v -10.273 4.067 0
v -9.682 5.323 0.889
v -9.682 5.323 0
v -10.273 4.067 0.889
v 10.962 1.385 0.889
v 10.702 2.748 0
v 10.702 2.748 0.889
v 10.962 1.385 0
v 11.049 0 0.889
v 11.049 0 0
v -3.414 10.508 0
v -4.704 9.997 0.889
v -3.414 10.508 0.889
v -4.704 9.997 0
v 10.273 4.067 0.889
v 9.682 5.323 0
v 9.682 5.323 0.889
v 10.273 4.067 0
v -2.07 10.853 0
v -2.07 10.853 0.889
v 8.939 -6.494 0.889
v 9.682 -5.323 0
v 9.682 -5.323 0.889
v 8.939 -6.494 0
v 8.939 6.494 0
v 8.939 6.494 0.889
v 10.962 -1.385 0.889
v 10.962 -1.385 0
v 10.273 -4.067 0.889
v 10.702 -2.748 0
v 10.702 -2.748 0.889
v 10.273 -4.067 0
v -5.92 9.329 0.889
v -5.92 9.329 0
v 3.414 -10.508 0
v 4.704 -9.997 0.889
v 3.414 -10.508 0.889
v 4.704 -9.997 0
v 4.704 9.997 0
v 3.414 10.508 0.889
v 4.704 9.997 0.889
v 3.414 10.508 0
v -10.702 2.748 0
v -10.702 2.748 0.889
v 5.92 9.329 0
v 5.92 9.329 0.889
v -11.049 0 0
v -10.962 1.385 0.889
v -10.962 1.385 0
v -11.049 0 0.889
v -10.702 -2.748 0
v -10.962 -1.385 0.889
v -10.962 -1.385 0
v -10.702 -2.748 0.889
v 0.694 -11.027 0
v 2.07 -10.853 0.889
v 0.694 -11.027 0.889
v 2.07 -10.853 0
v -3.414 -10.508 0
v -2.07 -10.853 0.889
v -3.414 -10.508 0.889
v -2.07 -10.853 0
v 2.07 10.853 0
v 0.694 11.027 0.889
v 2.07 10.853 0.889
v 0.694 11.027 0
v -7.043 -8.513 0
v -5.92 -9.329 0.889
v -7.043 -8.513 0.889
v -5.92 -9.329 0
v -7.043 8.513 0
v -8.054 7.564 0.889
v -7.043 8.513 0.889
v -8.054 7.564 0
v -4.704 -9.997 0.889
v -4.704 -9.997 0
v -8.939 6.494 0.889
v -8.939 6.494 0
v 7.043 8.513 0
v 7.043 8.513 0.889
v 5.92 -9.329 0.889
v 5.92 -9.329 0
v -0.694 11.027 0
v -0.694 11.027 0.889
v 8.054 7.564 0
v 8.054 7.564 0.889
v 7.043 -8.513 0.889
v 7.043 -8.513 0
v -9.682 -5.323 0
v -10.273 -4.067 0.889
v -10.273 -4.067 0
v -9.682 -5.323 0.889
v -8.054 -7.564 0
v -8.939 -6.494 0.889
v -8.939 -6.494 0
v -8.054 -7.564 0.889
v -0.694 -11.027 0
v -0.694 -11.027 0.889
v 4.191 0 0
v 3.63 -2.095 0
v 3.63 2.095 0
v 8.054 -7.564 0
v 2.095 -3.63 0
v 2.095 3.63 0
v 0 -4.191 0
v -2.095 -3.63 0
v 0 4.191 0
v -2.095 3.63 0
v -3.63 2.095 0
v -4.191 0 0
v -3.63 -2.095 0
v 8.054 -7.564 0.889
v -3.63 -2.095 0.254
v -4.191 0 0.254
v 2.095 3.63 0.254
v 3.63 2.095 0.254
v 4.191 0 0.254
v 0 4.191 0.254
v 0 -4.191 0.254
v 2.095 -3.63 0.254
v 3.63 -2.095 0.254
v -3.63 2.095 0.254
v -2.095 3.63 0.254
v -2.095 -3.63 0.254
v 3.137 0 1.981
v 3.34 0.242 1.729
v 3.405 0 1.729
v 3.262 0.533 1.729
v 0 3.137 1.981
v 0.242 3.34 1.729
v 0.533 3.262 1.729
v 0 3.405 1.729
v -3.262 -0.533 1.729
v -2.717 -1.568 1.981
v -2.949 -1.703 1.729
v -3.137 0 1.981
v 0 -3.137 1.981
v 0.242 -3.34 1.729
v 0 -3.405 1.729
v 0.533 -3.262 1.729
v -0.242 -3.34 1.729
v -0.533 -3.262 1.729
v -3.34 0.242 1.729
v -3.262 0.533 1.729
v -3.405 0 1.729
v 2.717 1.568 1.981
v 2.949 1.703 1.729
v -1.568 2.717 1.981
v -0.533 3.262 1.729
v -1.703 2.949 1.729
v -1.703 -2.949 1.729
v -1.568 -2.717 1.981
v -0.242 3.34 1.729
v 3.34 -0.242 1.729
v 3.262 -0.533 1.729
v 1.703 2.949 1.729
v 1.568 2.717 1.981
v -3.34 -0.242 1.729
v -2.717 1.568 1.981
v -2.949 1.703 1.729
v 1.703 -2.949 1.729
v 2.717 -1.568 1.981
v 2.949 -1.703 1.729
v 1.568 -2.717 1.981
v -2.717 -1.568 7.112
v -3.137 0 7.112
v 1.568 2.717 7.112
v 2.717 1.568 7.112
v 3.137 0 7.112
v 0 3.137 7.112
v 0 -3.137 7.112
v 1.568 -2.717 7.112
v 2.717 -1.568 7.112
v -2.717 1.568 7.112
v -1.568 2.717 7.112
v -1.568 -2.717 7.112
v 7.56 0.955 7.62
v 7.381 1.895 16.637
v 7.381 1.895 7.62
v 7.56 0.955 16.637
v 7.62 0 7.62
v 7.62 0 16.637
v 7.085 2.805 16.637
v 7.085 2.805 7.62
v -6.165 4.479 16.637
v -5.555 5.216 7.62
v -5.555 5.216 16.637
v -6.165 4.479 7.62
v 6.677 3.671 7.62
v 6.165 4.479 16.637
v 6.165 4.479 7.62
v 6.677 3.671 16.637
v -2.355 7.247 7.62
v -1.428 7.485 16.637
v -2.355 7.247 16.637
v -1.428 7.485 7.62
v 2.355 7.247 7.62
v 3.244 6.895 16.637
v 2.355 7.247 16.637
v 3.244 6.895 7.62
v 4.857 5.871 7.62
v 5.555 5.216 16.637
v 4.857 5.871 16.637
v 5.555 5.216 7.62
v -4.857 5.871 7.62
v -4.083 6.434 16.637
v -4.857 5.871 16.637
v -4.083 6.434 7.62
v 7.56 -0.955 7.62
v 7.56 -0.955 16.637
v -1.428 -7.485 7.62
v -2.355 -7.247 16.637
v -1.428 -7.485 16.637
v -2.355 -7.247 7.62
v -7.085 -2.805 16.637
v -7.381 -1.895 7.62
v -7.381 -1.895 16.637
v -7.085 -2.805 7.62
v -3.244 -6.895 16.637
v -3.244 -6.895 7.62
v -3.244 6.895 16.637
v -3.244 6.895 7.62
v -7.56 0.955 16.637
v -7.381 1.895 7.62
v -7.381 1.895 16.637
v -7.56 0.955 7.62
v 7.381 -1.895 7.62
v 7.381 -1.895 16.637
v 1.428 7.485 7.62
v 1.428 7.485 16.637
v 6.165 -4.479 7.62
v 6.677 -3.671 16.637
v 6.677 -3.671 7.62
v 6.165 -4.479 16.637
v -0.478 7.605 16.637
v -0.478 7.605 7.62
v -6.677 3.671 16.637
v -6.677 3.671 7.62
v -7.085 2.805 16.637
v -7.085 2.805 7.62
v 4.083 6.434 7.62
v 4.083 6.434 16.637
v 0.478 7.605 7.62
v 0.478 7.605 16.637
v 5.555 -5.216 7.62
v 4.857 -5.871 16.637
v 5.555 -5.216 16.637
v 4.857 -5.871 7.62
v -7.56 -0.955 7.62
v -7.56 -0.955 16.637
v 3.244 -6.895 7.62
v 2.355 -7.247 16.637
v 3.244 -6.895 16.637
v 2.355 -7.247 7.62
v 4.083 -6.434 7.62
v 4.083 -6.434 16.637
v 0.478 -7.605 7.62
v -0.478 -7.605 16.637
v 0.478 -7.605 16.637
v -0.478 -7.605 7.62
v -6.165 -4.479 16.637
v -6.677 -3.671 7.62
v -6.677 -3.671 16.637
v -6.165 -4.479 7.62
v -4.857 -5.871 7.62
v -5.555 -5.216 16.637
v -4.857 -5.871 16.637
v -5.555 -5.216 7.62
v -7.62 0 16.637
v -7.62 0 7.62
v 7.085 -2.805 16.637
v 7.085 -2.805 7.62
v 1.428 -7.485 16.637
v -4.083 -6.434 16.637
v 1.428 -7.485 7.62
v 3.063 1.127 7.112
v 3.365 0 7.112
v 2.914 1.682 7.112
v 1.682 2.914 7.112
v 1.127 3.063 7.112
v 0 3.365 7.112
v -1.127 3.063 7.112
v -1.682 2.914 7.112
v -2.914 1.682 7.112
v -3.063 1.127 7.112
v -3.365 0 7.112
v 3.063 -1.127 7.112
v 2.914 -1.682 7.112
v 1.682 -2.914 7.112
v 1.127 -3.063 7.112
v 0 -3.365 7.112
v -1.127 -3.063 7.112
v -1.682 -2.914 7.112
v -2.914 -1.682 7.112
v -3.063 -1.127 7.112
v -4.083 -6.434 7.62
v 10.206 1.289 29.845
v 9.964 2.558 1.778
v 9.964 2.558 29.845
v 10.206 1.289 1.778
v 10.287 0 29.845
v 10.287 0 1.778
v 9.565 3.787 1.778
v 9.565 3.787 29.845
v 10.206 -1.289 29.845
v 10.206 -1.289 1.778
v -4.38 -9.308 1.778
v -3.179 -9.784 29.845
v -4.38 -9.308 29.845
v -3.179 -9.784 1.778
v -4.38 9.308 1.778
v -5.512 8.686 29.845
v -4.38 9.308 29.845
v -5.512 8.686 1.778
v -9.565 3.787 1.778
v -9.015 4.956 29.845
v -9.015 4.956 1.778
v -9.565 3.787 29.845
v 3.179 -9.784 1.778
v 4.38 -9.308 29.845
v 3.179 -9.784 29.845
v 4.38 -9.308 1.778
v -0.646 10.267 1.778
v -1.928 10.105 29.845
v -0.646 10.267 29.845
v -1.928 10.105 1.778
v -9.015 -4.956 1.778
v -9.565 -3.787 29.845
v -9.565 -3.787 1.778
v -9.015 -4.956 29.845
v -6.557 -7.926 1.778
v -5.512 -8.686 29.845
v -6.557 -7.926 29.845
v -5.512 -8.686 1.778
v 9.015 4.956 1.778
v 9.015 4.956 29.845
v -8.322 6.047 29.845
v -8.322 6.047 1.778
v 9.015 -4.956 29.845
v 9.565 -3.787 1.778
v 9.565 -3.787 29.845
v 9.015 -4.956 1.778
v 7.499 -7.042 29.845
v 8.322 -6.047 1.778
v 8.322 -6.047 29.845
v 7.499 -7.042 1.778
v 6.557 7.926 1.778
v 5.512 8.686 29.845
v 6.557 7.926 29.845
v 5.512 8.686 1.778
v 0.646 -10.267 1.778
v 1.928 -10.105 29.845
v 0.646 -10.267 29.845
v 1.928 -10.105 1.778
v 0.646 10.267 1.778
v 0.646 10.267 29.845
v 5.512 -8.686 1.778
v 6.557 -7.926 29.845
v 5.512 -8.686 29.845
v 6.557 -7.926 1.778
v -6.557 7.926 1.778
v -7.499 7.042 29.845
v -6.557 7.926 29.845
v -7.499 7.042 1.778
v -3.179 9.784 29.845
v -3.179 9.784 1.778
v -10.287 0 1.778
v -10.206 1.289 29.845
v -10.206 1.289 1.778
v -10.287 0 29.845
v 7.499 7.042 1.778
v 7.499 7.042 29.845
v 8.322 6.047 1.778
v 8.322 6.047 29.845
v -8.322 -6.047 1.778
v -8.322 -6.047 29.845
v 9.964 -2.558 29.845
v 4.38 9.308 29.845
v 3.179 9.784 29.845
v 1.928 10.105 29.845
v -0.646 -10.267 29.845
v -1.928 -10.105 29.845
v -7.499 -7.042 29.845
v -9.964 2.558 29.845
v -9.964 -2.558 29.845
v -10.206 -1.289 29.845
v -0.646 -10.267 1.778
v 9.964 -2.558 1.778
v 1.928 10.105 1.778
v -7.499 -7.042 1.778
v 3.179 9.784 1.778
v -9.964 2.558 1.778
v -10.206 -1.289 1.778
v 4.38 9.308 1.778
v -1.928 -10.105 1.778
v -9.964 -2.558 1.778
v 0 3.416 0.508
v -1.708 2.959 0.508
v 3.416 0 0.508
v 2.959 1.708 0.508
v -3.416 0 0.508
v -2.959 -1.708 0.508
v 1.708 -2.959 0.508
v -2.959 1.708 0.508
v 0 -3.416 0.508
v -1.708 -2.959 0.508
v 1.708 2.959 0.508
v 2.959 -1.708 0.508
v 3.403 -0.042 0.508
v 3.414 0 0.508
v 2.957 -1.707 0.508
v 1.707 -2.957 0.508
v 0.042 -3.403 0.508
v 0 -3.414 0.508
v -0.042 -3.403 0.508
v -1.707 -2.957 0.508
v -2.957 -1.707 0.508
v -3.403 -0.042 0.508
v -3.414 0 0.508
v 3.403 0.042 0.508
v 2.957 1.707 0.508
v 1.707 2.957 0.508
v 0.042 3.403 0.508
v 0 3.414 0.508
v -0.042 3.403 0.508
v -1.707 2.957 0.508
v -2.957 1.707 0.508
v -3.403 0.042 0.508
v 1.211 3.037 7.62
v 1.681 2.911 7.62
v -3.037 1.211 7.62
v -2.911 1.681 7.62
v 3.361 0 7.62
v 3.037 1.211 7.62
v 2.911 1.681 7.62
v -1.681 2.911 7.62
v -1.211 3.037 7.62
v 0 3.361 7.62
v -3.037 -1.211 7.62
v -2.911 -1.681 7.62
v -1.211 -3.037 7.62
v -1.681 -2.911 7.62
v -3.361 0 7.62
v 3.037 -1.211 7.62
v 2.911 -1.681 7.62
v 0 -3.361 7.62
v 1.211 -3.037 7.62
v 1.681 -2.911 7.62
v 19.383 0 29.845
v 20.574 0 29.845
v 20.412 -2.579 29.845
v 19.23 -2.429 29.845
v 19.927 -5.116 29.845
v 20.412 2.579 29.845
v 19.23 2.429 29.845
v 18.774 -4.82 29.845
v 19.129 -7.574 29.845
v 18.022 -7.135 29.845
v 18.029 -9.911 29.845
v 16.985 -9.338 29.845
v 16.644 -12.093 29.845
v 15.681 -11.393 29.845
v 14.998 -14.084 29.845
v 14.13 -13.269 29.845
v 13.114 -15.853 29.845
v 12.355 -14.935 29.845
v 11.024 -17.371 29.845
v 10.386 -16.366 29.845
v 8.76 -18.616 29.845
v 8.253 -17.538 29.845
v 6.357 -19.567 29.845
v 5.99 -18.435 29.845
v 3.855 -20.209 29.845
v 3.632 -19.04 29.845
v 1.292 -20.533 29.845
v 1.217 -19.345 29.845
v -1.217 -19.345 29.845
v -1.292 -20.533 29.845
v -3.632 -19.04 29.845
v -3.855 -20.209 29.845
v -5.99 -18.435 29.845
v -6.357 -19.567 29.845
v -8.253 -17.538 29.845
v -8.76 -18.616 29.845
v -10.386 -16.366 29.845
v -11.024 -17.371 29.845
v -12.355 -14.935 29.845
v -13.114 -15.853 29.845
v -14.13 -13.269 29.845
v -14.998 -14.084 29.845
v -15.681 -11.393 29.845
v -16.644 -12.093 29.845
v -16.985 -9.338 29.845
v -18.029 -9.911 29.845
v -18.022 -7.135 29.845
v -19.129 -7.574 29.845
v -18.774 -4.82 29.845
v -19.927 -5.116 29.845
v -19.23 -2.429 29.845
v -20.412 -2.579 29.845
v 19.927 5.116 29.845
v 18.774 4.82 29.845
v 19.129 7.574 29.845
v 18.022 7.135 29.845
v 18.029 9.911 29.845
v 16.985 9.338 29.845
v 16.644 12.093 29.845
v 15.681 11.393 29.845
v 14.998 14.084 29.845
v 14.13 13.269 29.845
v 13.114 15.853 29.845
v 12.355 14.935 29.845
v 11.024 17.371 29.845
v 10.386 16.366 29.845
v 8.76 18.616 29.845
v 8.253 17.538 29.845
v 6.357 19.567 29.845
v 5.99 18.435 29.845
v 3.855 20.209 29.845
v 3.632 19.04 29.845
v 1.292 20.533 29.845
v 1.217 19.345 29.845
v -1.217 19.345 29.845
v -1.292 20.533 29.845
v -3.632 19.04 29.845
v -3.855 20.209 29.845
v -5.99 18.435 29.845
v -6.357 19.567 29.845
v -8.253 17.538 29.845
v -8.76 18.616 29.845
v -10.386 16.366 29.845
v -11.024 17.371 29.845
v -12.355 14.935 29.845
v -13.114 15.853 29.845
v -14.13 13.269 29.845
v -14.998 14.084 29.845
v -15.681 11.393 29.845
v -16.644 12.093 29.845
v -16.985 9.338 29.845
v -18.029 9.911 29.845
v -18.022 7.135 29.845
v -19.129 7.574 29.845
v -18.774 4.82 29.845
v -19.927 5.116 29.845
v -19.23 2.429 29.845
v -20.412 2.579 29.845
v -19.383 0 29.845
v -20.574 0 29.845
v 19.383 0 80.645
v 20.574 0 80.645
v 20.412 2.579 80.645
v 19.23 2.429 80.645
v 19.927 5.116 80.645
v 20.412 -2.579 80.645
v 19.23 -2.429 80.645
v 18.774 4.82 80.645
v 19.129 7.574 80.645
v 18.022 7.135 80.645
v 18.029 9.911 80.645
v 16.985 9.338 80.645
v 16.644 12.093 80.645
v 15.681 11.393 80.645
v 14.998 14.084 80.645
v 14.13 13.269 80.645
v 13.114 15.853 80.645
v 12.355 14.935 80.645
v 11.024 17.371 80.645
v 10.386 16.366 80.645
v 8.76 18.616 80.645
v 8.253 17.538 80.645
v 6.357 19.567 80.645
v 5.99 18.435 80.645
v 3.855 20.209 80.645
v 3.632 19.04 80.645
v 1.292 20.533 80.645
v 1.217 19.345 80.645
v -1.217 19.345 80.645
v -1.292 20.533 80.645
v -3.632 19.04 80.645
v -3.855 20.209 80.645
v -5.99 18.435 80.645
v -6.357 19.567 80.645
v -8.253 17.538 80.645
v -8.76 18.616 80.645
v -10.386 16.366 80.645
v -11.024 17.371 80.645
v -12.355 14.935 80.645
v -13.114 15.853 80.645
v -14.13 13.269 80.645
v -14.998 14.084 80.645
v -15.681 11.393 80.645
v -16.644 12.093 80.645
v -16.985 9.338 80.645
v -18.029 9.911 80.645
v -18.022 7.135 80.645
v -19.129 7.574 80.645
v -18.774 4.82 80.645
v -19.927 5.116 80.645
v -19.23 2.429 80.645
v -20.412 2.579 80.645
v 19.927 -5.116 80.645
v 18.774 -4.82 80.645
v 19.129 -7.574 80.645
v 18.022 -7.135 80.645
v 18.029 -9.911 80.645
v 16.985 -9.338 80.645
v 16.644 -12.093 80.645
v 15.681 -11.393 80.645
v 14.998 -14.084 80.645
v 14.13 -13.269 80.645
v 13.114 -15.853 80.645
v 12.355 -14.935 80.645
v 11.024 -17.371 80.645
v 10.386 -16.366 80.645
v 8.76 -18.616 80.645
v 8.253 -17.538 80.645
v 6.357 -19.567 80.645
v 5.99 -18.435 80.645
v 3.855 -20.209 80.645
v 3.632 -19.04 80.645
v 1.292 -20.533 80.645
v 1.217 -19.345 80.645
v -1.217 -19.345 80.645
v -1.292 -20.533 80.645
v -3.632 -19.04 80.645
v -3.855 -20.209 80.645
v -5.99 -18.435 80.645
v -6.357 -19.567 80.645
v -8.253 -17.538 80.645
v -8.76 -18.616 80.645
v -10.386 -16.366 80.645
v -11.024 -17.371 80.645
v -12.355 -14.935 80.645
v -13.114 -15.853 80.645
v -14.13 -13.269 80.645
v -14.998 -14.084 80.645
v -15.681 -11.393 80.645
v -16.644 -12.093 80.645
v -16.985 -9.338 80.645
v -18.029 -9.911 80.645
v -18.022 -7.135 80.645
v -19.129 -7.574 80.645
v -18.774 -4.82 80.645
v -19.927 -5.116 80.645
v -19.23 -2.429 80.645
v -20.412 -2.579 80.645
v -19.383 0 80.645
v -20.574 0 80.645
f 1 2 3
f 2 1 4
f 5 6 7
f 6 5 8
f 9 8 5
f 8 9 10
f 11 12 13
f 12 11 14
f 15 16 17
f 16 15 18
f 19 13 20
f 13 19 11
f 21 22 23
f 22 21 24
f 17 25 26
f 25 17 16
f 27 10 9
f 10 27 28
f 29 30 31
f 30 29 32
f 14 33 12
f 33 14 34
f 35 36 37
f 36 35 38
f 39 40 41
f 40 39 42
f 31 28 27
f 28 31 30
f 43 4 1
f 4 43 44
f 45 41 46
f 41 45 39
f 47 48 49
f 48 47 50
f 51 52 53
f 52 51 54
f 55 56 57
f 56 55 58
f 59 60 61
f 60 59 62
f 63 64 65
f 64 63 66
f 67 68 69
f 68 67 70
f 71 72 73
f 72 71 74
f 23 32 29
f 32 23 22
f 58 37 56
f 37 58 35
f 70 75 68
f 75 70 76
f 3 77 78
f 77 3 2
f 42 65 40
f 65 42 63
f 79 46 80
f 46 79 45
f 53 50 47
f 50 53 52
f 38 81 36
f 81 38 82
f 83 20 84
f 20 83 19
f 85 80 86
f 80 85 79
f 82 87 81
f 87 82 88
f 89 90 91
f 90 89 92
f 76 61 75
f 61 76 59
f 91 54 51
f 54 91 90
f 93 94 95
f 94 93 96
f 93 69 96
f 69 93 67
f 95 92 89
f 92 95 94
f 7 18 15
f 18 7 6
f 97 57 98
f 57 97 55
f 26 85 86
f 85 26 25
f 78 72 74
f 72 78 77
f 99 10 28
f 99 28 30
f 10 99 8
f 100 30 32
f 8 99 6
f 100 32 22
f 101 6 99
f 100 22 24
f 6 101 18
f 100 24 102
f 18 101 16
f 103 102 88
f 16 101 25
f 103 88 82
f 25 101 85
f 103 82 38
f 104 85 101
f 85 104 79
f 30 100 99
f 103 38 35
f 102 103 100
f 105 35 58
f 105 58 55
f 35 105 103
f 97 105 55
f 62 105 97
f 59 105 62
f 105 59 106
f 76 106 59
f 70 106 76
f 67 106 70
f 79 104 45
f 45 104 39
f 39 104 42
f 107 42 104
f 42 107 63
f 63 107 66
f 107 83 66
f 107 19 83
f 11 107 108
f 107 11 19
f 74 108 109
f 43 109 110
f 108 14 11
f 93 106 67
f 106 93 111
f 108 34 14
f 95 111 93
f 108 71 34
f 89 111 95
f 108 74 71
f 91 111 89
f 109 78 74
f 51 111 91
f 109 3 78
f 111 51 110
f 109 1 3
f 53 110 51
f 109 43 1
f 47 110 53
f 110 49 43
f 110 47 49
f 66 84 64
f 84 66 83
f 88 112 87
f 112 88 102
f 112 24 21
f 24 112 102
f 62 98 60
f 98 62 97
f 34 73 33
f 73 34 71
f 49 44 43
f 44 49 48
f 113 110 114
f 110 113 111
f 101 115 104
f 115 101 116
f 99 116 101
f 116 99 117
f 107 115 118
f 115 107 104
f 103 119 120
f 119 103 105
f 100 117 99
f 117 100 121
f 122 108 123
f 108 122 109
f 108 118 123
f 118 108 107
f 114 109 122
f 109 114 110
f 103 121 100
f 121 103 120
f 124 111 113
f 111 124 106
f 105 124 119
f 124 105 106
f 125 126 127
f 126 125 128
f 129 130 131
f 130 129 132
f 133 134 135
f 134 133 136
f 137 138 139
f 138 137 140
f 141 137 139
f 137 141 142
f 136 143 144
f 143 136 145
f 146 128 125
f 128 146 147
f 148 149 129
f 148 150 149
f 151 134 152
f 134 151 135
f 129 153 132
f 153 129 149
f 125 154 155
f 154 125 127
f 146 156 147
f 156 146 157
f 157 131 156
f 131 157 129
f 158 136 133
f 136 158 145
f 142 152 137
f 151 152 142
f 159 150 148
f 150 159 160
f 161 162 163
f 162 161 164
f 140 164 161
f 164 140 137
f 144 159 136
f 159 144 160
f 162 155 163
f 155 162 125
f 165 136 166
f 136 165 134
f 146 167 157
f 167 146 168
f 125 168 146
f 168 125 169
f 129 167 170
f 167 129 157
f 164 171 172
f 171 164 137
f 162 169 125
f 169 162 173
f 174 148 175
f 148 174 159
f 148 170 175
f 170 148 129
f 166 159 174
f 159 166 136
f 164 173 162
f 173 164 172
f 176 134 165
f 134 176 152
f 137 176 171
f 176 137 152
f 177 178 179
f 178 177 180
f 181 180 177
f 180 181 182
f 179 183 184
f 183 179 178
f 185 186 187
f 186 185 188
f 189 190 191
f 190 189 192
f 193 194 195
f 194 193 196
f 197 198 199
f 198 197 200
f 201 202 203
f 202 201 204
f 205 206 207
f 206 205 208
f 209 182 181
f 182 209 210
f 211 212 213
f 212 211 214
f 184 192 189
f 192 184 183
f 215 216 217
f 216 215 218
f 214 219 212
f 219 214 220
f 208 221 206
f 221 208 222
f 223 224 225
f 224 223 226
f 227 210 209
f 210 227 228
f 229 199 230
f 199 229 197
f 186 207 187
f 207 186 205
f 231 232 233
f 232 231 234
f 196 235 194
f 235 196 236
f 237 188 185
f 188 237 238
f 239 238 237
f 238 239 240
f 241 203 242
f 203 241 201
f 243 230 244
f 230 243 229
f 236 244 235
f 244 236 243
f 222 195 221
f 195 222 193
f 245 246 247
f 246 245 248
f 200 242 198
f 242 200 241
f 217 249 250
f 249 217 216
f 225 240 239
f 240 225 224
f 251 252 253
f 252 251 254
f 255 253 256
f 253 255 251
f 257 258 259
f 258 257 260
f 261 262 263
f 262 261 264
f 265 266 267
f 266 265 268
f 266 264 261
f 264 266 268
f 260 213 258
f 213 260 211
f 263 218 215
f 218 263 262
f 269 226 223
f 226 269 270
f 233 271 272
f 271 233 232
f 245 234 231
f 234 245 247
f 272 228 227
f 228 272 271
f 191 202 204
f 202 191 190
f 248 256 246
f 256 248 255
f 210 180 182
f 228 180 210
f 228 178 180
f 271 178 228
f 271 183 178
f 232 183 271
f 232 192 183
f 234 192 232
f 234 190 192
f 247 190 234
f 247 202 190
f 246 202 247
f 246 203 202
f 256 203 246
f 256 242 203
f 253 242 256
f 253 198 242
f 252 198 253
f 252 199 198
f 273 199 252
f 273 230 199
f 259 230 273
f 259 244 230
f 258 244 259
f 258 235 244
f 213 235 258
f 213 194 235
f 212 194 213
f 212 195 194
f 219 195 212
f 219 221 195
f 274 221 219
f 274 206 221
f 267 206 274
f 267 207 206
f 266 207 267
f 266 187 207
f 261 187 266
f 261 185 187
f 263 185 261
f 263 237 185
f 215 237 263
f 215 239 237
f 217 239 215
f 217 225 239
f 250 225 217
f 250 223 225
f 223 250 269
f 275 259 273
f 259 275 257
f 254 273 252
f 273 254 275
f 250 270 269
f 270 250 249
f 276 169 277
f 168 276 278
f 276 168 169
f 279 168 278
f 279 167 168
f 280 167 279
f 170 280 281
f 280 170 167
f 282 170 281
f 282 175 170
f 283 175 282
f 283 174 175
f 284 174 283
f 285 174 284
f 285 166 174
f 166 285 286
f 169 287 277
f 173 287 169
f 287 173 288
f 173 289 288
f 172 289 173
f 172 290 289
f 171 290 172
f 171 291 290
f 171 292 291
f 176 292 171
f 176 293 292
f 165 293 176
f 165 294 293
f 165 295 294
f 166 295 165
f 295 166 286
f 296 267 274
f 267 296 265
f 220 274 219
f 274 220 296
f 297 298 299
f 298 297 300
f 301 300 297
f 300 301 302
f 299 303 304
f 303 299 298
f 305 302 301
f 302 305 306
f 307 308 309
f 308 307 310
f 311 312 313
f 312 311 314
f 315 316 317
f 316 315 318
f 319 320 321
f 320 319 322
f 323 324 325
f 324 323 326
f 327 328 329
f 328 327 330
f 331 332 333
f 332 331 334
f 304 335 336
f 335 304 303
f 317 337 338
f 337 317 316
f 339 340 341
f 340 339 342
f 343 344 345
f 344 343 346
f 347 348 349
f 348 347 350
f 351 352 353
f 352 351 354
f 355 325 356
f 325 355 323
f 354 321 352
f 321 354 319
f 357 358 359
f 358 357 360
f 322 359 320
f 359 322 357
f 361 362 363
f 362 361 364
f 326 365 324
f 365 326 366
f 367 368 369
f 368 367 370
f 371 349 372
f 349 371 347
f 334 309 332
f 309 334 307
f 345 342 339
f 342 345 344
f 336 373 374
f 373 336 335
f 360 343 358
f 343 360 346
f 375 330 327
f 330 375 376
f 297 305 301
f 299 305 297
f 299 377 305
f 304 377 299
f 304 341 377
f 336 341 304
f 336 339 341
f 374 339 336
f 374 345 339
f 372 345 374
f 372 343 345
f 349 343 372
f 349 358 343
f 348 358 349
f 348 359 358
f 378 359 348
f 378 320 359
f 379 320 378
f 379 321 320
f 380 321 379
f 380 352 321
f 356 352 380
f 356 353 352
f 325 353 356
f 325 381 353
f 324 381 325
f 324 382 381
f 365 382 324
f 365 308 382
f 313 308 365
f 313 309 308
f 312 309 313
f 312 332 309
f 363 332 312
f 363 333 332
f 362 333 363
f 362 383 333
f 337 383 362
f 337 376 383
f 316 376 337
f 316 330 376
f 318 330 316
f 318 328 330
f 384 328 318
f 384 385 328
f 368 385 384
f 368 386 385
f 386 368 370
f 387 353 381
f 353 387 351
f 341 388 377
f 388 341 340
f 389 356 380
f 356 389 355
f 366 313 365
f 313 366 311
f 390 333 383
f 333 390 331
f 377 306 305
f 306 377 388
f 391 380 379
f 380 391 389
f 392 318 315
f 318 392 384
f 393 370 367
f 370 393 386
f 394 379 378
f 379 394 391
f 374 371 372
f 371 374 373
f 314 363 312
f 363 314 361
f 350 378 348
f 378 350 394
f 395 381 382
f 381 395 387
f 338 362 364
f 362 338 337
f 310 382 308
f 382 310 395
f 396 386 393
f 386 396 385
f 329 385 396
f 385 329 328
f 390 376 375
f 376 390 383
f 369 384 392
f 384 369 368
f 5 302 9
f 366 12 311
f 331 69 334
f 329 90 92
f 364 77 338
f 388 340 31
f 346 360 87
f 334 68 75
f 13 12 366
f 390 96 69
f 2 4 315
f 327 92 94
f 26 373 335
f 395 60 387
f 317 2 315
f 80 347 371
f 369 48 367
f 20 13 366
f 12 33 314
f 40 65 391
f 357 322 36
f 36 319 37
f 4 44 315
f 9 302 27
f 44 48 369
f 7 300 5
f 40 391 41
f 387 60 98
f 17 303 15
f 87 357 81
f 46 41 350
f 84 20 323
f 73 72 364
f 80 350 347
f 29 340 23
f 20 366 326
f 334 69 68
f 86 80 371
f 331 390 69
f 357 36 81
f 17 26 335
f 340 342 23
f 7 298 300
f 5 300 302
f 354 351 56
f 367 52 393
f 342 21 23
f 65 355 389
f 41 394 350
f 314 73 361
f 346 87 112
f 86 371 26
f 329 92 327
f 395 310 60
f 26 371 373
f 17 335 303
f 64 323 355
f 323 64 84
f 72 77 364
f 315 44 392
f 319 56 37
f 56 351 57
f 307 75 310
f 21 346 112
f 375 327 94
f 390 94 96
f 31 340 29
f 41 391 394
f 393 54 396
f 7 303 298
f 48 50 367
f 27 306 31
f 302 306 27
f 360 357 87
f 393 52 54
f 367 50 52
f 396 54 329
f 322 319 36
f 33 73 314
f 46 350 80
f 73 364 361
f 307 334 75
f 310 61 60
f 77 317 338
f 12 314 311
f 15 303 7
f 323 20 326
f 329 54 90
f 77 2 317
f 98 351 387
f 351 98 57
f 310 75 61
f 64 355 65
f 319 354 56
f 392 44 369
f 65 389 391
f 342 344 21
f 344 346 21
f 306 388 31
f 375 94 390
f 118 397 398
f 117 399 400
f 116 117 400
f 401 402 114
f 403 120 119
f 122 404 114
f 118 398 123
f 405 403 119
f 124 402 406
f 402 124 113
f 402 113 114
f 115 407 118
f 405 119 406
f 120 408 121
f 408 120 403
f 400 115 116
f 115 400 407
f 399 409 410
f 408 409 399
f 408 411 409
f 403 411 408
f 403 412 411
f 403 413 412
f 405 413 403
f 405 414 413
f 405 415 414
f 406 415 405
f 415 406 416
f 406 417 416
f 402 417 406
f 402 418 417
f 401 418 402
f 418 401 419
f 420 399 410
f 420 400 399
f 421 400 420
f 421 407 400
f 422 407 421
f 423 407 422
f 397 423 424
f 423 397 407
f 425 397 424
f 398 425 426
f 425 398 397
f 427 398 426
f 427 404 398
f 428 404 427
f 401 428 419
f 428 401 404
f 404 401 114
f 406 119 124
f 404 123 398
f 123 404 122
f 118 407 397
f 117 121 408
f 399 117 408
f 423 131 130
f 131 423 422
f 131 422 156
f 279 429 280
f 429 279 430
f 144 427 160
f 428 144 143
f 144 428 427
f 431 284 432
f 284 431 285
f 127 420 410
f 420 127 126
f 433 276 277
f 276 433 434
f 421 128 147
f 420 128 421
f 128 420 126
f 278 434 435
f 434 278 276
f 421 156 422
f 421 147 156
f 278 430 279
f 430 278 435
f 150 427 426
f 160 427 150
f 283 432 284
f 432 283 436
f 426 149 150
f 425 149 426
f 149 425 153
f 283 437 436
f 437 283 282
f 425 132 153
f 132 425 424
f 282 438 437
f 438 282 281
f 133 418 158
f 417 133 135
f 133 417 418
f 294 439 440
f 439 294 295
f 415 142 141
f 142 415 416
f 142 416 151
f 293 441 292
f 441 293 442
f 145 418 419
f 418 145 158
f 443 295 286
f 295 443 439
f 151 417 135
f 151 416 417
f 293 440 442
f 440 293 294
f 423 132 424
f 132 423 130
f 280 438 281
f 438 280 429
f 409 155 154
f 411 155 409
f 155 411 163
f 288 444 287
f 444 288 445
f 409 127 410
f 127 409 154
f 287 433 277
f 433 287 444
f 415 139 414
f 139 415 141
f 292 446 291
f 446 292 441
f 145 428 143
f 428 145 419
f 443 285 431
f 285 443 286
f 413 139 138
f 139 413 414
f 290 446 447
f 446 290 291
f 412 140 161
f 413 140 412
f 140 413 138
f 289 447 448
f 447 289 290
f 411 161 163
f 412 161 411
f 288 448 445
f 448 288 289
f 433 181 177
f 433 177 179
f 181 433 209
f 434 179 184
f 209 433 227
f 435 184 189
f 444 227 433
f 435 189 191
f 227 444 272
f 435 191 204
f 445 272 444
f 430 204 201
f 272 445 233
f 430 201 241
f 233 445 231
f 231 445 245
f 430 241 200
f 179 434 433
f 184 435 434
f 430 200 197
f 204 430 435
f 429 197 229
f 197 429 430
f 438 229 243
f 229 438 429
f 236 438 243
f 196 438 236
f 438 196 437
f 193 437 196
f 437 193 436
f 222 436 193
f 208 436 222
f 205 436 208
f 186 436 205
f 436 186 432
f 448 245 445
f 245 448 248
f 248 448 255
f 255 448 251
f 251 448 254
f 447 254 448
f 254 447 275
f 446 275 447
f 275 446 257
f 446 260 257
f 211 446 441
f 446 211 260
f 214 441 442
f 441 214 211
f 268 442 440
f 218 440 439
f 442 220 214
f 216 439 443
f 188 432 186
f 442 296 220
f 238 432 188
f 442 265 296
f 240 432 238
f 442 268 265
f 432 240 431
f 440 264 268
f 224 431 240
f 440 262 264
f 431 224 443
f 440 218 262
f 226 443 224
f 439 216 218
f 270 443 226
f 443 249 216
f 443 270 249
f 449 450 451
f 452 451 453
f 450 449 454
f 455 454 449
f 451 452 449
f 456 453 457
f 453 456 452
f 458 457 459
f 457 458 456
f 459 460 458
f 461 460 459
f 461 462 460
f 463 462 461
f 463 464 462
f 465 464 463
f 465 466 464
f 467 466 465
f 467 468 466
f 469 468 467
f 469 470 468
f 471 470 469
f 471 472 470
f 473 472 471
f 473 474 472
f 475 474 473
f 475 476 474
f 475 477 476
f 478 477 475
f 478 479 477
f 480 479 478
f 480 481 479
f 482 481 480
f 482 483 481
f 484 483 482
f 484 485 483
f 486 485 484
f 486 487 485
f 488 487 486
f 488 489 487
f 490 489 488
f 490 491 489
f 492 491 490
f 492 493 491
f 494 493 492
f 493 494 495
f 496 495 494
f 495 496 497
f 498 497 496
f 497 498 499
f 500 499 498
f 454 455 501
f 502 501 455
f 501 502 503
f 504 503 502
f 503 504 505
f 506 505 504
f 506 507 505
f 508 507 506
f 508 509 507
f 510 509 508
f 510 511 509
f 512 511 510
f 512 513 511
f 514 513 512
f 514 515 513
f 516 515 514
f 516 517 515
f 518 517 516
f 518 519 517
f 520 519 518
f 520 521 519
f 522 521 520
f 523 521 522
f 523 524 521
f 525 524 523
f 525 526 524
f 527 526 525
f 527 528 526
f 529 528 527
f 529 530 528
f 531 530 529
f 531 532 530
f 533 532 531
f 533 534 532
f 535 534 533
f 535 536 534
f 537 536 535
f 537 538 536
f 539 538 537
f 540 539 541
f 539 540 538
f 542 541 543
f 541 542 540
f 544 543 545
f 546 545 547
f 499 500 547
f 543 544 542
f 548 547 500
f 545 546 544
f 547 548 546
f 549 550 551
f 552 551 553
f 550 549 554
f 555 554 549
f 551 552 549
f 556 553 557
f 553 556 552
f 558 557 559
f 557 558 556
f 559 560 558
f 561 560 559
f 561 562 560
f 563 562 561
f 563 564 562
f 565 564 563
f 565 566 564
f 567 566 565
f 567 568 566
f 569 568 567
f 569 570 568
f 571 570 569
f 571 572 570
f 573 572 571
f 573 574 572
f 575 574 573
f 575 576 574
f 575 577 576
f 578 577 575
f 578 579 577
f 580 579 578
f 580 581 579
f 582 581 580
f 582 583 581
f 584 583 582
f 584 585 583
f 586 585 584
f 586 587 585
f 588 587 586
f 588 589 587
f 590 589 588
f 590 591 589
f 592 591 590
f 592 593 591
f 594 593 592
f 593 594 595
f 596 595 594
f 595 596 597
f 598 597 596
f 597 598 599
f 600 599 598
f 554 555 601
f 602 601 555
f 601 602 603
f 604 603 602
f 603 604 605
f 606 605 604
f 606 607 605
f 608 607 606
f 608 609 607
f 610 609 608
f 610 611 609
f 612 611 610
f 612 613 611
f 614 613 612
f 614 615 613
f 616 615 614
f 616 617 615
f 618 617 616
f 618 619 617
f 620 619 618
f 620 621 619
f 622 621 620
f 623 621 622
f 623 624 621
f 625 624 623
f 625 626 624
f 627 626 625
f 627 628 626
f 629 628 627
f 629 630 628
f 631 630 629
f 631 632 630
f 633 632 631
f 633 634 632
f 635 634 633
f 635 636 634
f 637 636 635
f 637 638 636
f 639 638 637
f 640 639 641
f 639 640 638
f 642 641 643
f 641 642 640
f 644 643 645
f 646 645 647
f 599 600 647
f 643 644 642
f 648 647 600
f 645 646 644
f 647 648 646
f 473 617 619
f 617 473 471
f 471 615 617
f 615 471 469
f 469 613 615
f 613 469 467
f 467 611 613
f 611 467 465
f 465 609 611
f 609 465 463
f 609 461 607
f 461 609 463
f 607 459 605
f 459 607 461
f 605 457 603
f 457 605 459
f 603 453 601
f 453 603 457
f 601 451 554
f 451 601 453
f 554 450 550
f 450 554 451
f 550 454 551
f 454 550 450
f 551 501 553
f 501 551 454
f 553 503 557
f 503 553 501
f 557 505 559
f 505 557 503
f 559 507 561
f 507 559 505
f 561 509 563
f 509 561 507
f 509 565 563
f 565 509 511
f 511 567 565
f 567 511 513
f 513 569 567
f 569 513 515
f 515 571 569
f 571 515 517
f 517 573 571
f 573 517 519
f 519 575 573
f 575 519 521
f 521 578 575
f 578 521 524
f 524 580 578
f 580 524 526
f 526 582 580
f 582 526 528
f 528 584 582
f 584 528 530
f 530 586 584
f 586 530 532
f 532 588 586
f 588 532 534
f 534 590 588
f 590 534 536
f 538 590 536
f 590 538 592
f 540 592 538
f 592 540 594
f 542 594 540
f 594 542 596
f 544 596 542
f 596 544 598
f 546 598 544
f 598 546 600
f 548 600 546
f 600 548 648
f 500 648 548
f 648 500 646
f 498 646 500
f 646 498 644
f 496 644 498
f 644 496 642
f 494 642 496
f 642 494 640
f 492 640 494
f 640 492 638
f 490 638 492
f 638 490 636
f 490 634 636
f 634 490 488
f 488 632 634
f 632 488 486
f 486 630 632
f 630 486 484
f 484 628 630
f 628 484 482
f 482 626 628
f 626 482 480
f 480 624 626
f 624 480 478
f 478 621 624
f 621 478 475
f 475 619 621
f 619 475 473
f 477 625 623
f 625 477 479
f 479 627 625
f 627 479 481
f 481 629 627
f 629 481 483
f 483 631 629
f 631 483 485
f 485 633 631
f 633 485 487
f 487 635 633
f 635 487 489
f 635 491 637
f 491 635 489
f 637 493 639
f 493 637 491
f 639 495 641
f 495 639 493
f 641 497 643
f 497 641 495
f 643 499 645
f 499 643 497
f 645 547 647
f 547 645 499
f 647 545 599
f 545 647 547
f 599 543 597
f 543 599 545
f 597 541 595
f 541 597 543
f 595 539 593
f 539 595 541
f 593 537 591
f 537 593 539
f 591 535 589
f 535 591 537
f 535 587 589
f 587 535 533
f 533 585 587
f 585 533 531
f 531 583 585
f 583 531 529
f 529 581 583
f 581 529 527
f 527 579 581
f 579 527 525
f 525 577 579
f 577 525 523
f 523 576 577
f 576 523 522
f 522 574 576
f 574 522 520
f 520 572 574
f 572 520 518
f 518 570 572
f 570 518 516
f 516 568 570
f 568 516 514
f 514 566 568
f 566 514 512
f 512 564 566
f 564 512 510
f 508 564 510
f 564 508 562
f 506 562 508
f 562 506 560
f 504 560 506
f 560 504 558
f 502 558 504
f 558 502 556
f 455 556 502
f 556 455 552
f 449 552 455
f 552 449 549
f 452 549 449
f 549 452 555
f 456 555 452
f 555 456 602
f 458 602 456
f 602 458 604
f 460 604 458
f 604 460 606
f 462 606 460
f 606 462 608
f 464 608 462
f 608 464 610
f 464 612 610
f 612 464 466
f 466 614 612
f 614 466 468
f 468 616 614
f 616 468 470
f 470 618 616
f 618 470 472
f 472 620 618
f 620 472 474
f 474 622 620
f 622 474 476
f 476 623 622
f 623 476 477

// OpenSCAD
// file: Primer.scad
//
// Primer dimensions
//

PrimerRimDiameter   = 1; // Diameter of the rim
PrimerRimHeight     = 2; // Height of the rim
PrimerHeight        = 3; // Total height of the primer
PrimerMajorDiameter = 4; // Measured just above the rim of the primer
PrimerMinorDiameter = 5; // Measured near the tip of the primer
PrimerClearance     = 6; // Extra clearance for fitting
PrimerFn            = 7; // Sides, for rendering


// Produces no primer
PrimerDummy = [
  [PrimerRimDiameter,   0],
  [PrimerRimHeight,     0],
  [PrimerHeight,        0],
  [PrimerMajorDiameter, 0],
  [PrimerMinorDiameter, 0],
  [PrimerClearance,     0],
  [PrimerFn,            0]
];

// .209 type (based on Fiocchi 616)
Primer209 = [
  [PrimerRimDiameter,   0.309],
  [PrimerRimHeight,     0.01],
  [PrimerHeight,        0.3],
  [PrimerMajorDiameter, 0.248],
  [PrimerMinorDiameter, 0.242],
  [PrimerClearance,     0.021],
  [PrimerFn,            12]
];

// .22 cal "Powder Actuated Tool" aka. Ramset
Primer22PAT = [
  [PrimerRimDiameter,   0.309],
  [PrimerRimHeight,     0.039],
  [PrimerHeight,        0.28],
  [PrimerMajorDiameter, 0.226],
  [PrimerMinorDiameter, 0.226],
  [PrimerClearance,     0.021],
  [PrimerFn,            12]
];

// 12 gram CO2 cartridge mouth and neck
Primer12gCO2 = [
  [PrimerRimDiameter,   0.315],
  [PrimerRimHeight,     0.24],
  [PrimerHeight,        0.29],
  [PrimerMajorDiameter, 0.315],
  [PrimerMinorDiameter, 0.76],
  [PrimerClearance,     0],
  [PrimerFn,            12]
];

function PrimerOAHeight(primer=undef) = lookup(PrimerHeight, primer) + lookup(PrimerRimHeight, primer);

module Primer(primer=Primer209, extend=0.001) {
  render()
  union() {

    // Rim
    translate([0,0,-extend])
    cylinder(r=(lookup(PrimerRimDiameter, primer)+lookup(PrimerClearance, primer))/2,
      h=lookup(PrimerRimHeight, primer) + extend,
      $fn=lookup(PrimerFn, primer));

    // Rim Taper
    translate([0,0,lookup(PrimerRimHeight, primer)])
    cylinder(r1=(lookup(PrimerRimDiameter, primer)+lookup(PrimerClearance, primer))/2,
      r2=(lookup(PrimerMajorDiameter, primer)+lookup(PrimerClearance, primer))/2,
      h=lookup(PrimerRimHeight, primer),
      $fn=lookup(PrimerFn, primer));

    // Primer
    translate([0,0,lookup(PrimerRimHeight, primer)])
    cylinder(r1=(lookup(PrimerMajorDiameter, primer) + lookup(PrimerClearance, primer))/2,
             r2=(lookup(PrimerMinorDiameter, primer) + lookup(PrimerClearance, primer))/2,
             h=lookup(PrimerHeight, primer) + 0.1,
             $fn=lookup(PrimerFn, primer));
  }
}

// scale([25.4, 25.4, 25.4]) Primer();
// file: Shell Base.scad
include <../Vitamins/Pipe.scad>;
include <Primer.scad>;

function ShellRadius(chamber) = PipeInnerRadius(chamber);

module ShellBase(chamber=12GaugeChamber, primer=Primer22PAT,
                 chargeDiameter=0.6, chargeHeight=3/8, wadHeight=0.5,
                 rimDiameter=0.87, rimHeight=0.07,
                 dummy=false, $fn=50) {

  shellBaseHeight = lookup(PrimerHeight, primer) + chargeHeight + wadHeight;
  echo("ShellBase Height: ", shellBaseHeight);

  union() {

    // Base and rim, minus charge pocket and primer hole
    difference() {
      union() {
        // Body
        color("Yellow")
        translate([0,0,rimHeight/2])
        cylinder(r=ShellRadius(chamber),
                 h=shellBaseHeight - (rimHeight/2));

        // Rim
        color("Blue")
        cylinder(r=rimDiameter/2, h=rimHeight/2);

        // Rim Taper
        translate([0,0,rimHeight/2])
        cylinder(r1=rimDiameter/2, r2=ShellRadius(chamber), h=rimHeight/2);
      }

      if (dummy == false) {

        // Charge Pocket
        color("Green")
        translate([0,0,lookup(PrimerHeight, primer)])
        cylinder(r=chargeDiameter/2, h=chargeHeight);

        // Primer
        color("Red")
        Primer(primer=primer);
      }
    }

    // Payload
    translate([0,0,lookup(PrimerHeight, primer) + chargeHeight + wadHeight])
    children();
  }
}

scale([25.4, 25.4, 25.4])
ShellBase() {
  %cylinder(r=ShellRadius(PipeThreeQuarterInch));
};
// main file
include <Shell Base.scad>;
include <../Vitamins/Pipe.scad>;

module ShellShot(chamber=PipeThreeQuarterInch, primer=Primer209, wall=3/64) {
  ShellBase(chamber=chamber, primer=primer) {
    radius = PipeInnerRadius(pipe=chamber, clearance=lookup(PipeClearanceLoose, chamber));
    
    color("Orange")
    linear_extrude(height=2) 
    difference() {
      circle(r=radius);
      circle(r=radius - wall);
    }
  }
}

scale([25.4, 25.4, 25.4]) ShellShot();
